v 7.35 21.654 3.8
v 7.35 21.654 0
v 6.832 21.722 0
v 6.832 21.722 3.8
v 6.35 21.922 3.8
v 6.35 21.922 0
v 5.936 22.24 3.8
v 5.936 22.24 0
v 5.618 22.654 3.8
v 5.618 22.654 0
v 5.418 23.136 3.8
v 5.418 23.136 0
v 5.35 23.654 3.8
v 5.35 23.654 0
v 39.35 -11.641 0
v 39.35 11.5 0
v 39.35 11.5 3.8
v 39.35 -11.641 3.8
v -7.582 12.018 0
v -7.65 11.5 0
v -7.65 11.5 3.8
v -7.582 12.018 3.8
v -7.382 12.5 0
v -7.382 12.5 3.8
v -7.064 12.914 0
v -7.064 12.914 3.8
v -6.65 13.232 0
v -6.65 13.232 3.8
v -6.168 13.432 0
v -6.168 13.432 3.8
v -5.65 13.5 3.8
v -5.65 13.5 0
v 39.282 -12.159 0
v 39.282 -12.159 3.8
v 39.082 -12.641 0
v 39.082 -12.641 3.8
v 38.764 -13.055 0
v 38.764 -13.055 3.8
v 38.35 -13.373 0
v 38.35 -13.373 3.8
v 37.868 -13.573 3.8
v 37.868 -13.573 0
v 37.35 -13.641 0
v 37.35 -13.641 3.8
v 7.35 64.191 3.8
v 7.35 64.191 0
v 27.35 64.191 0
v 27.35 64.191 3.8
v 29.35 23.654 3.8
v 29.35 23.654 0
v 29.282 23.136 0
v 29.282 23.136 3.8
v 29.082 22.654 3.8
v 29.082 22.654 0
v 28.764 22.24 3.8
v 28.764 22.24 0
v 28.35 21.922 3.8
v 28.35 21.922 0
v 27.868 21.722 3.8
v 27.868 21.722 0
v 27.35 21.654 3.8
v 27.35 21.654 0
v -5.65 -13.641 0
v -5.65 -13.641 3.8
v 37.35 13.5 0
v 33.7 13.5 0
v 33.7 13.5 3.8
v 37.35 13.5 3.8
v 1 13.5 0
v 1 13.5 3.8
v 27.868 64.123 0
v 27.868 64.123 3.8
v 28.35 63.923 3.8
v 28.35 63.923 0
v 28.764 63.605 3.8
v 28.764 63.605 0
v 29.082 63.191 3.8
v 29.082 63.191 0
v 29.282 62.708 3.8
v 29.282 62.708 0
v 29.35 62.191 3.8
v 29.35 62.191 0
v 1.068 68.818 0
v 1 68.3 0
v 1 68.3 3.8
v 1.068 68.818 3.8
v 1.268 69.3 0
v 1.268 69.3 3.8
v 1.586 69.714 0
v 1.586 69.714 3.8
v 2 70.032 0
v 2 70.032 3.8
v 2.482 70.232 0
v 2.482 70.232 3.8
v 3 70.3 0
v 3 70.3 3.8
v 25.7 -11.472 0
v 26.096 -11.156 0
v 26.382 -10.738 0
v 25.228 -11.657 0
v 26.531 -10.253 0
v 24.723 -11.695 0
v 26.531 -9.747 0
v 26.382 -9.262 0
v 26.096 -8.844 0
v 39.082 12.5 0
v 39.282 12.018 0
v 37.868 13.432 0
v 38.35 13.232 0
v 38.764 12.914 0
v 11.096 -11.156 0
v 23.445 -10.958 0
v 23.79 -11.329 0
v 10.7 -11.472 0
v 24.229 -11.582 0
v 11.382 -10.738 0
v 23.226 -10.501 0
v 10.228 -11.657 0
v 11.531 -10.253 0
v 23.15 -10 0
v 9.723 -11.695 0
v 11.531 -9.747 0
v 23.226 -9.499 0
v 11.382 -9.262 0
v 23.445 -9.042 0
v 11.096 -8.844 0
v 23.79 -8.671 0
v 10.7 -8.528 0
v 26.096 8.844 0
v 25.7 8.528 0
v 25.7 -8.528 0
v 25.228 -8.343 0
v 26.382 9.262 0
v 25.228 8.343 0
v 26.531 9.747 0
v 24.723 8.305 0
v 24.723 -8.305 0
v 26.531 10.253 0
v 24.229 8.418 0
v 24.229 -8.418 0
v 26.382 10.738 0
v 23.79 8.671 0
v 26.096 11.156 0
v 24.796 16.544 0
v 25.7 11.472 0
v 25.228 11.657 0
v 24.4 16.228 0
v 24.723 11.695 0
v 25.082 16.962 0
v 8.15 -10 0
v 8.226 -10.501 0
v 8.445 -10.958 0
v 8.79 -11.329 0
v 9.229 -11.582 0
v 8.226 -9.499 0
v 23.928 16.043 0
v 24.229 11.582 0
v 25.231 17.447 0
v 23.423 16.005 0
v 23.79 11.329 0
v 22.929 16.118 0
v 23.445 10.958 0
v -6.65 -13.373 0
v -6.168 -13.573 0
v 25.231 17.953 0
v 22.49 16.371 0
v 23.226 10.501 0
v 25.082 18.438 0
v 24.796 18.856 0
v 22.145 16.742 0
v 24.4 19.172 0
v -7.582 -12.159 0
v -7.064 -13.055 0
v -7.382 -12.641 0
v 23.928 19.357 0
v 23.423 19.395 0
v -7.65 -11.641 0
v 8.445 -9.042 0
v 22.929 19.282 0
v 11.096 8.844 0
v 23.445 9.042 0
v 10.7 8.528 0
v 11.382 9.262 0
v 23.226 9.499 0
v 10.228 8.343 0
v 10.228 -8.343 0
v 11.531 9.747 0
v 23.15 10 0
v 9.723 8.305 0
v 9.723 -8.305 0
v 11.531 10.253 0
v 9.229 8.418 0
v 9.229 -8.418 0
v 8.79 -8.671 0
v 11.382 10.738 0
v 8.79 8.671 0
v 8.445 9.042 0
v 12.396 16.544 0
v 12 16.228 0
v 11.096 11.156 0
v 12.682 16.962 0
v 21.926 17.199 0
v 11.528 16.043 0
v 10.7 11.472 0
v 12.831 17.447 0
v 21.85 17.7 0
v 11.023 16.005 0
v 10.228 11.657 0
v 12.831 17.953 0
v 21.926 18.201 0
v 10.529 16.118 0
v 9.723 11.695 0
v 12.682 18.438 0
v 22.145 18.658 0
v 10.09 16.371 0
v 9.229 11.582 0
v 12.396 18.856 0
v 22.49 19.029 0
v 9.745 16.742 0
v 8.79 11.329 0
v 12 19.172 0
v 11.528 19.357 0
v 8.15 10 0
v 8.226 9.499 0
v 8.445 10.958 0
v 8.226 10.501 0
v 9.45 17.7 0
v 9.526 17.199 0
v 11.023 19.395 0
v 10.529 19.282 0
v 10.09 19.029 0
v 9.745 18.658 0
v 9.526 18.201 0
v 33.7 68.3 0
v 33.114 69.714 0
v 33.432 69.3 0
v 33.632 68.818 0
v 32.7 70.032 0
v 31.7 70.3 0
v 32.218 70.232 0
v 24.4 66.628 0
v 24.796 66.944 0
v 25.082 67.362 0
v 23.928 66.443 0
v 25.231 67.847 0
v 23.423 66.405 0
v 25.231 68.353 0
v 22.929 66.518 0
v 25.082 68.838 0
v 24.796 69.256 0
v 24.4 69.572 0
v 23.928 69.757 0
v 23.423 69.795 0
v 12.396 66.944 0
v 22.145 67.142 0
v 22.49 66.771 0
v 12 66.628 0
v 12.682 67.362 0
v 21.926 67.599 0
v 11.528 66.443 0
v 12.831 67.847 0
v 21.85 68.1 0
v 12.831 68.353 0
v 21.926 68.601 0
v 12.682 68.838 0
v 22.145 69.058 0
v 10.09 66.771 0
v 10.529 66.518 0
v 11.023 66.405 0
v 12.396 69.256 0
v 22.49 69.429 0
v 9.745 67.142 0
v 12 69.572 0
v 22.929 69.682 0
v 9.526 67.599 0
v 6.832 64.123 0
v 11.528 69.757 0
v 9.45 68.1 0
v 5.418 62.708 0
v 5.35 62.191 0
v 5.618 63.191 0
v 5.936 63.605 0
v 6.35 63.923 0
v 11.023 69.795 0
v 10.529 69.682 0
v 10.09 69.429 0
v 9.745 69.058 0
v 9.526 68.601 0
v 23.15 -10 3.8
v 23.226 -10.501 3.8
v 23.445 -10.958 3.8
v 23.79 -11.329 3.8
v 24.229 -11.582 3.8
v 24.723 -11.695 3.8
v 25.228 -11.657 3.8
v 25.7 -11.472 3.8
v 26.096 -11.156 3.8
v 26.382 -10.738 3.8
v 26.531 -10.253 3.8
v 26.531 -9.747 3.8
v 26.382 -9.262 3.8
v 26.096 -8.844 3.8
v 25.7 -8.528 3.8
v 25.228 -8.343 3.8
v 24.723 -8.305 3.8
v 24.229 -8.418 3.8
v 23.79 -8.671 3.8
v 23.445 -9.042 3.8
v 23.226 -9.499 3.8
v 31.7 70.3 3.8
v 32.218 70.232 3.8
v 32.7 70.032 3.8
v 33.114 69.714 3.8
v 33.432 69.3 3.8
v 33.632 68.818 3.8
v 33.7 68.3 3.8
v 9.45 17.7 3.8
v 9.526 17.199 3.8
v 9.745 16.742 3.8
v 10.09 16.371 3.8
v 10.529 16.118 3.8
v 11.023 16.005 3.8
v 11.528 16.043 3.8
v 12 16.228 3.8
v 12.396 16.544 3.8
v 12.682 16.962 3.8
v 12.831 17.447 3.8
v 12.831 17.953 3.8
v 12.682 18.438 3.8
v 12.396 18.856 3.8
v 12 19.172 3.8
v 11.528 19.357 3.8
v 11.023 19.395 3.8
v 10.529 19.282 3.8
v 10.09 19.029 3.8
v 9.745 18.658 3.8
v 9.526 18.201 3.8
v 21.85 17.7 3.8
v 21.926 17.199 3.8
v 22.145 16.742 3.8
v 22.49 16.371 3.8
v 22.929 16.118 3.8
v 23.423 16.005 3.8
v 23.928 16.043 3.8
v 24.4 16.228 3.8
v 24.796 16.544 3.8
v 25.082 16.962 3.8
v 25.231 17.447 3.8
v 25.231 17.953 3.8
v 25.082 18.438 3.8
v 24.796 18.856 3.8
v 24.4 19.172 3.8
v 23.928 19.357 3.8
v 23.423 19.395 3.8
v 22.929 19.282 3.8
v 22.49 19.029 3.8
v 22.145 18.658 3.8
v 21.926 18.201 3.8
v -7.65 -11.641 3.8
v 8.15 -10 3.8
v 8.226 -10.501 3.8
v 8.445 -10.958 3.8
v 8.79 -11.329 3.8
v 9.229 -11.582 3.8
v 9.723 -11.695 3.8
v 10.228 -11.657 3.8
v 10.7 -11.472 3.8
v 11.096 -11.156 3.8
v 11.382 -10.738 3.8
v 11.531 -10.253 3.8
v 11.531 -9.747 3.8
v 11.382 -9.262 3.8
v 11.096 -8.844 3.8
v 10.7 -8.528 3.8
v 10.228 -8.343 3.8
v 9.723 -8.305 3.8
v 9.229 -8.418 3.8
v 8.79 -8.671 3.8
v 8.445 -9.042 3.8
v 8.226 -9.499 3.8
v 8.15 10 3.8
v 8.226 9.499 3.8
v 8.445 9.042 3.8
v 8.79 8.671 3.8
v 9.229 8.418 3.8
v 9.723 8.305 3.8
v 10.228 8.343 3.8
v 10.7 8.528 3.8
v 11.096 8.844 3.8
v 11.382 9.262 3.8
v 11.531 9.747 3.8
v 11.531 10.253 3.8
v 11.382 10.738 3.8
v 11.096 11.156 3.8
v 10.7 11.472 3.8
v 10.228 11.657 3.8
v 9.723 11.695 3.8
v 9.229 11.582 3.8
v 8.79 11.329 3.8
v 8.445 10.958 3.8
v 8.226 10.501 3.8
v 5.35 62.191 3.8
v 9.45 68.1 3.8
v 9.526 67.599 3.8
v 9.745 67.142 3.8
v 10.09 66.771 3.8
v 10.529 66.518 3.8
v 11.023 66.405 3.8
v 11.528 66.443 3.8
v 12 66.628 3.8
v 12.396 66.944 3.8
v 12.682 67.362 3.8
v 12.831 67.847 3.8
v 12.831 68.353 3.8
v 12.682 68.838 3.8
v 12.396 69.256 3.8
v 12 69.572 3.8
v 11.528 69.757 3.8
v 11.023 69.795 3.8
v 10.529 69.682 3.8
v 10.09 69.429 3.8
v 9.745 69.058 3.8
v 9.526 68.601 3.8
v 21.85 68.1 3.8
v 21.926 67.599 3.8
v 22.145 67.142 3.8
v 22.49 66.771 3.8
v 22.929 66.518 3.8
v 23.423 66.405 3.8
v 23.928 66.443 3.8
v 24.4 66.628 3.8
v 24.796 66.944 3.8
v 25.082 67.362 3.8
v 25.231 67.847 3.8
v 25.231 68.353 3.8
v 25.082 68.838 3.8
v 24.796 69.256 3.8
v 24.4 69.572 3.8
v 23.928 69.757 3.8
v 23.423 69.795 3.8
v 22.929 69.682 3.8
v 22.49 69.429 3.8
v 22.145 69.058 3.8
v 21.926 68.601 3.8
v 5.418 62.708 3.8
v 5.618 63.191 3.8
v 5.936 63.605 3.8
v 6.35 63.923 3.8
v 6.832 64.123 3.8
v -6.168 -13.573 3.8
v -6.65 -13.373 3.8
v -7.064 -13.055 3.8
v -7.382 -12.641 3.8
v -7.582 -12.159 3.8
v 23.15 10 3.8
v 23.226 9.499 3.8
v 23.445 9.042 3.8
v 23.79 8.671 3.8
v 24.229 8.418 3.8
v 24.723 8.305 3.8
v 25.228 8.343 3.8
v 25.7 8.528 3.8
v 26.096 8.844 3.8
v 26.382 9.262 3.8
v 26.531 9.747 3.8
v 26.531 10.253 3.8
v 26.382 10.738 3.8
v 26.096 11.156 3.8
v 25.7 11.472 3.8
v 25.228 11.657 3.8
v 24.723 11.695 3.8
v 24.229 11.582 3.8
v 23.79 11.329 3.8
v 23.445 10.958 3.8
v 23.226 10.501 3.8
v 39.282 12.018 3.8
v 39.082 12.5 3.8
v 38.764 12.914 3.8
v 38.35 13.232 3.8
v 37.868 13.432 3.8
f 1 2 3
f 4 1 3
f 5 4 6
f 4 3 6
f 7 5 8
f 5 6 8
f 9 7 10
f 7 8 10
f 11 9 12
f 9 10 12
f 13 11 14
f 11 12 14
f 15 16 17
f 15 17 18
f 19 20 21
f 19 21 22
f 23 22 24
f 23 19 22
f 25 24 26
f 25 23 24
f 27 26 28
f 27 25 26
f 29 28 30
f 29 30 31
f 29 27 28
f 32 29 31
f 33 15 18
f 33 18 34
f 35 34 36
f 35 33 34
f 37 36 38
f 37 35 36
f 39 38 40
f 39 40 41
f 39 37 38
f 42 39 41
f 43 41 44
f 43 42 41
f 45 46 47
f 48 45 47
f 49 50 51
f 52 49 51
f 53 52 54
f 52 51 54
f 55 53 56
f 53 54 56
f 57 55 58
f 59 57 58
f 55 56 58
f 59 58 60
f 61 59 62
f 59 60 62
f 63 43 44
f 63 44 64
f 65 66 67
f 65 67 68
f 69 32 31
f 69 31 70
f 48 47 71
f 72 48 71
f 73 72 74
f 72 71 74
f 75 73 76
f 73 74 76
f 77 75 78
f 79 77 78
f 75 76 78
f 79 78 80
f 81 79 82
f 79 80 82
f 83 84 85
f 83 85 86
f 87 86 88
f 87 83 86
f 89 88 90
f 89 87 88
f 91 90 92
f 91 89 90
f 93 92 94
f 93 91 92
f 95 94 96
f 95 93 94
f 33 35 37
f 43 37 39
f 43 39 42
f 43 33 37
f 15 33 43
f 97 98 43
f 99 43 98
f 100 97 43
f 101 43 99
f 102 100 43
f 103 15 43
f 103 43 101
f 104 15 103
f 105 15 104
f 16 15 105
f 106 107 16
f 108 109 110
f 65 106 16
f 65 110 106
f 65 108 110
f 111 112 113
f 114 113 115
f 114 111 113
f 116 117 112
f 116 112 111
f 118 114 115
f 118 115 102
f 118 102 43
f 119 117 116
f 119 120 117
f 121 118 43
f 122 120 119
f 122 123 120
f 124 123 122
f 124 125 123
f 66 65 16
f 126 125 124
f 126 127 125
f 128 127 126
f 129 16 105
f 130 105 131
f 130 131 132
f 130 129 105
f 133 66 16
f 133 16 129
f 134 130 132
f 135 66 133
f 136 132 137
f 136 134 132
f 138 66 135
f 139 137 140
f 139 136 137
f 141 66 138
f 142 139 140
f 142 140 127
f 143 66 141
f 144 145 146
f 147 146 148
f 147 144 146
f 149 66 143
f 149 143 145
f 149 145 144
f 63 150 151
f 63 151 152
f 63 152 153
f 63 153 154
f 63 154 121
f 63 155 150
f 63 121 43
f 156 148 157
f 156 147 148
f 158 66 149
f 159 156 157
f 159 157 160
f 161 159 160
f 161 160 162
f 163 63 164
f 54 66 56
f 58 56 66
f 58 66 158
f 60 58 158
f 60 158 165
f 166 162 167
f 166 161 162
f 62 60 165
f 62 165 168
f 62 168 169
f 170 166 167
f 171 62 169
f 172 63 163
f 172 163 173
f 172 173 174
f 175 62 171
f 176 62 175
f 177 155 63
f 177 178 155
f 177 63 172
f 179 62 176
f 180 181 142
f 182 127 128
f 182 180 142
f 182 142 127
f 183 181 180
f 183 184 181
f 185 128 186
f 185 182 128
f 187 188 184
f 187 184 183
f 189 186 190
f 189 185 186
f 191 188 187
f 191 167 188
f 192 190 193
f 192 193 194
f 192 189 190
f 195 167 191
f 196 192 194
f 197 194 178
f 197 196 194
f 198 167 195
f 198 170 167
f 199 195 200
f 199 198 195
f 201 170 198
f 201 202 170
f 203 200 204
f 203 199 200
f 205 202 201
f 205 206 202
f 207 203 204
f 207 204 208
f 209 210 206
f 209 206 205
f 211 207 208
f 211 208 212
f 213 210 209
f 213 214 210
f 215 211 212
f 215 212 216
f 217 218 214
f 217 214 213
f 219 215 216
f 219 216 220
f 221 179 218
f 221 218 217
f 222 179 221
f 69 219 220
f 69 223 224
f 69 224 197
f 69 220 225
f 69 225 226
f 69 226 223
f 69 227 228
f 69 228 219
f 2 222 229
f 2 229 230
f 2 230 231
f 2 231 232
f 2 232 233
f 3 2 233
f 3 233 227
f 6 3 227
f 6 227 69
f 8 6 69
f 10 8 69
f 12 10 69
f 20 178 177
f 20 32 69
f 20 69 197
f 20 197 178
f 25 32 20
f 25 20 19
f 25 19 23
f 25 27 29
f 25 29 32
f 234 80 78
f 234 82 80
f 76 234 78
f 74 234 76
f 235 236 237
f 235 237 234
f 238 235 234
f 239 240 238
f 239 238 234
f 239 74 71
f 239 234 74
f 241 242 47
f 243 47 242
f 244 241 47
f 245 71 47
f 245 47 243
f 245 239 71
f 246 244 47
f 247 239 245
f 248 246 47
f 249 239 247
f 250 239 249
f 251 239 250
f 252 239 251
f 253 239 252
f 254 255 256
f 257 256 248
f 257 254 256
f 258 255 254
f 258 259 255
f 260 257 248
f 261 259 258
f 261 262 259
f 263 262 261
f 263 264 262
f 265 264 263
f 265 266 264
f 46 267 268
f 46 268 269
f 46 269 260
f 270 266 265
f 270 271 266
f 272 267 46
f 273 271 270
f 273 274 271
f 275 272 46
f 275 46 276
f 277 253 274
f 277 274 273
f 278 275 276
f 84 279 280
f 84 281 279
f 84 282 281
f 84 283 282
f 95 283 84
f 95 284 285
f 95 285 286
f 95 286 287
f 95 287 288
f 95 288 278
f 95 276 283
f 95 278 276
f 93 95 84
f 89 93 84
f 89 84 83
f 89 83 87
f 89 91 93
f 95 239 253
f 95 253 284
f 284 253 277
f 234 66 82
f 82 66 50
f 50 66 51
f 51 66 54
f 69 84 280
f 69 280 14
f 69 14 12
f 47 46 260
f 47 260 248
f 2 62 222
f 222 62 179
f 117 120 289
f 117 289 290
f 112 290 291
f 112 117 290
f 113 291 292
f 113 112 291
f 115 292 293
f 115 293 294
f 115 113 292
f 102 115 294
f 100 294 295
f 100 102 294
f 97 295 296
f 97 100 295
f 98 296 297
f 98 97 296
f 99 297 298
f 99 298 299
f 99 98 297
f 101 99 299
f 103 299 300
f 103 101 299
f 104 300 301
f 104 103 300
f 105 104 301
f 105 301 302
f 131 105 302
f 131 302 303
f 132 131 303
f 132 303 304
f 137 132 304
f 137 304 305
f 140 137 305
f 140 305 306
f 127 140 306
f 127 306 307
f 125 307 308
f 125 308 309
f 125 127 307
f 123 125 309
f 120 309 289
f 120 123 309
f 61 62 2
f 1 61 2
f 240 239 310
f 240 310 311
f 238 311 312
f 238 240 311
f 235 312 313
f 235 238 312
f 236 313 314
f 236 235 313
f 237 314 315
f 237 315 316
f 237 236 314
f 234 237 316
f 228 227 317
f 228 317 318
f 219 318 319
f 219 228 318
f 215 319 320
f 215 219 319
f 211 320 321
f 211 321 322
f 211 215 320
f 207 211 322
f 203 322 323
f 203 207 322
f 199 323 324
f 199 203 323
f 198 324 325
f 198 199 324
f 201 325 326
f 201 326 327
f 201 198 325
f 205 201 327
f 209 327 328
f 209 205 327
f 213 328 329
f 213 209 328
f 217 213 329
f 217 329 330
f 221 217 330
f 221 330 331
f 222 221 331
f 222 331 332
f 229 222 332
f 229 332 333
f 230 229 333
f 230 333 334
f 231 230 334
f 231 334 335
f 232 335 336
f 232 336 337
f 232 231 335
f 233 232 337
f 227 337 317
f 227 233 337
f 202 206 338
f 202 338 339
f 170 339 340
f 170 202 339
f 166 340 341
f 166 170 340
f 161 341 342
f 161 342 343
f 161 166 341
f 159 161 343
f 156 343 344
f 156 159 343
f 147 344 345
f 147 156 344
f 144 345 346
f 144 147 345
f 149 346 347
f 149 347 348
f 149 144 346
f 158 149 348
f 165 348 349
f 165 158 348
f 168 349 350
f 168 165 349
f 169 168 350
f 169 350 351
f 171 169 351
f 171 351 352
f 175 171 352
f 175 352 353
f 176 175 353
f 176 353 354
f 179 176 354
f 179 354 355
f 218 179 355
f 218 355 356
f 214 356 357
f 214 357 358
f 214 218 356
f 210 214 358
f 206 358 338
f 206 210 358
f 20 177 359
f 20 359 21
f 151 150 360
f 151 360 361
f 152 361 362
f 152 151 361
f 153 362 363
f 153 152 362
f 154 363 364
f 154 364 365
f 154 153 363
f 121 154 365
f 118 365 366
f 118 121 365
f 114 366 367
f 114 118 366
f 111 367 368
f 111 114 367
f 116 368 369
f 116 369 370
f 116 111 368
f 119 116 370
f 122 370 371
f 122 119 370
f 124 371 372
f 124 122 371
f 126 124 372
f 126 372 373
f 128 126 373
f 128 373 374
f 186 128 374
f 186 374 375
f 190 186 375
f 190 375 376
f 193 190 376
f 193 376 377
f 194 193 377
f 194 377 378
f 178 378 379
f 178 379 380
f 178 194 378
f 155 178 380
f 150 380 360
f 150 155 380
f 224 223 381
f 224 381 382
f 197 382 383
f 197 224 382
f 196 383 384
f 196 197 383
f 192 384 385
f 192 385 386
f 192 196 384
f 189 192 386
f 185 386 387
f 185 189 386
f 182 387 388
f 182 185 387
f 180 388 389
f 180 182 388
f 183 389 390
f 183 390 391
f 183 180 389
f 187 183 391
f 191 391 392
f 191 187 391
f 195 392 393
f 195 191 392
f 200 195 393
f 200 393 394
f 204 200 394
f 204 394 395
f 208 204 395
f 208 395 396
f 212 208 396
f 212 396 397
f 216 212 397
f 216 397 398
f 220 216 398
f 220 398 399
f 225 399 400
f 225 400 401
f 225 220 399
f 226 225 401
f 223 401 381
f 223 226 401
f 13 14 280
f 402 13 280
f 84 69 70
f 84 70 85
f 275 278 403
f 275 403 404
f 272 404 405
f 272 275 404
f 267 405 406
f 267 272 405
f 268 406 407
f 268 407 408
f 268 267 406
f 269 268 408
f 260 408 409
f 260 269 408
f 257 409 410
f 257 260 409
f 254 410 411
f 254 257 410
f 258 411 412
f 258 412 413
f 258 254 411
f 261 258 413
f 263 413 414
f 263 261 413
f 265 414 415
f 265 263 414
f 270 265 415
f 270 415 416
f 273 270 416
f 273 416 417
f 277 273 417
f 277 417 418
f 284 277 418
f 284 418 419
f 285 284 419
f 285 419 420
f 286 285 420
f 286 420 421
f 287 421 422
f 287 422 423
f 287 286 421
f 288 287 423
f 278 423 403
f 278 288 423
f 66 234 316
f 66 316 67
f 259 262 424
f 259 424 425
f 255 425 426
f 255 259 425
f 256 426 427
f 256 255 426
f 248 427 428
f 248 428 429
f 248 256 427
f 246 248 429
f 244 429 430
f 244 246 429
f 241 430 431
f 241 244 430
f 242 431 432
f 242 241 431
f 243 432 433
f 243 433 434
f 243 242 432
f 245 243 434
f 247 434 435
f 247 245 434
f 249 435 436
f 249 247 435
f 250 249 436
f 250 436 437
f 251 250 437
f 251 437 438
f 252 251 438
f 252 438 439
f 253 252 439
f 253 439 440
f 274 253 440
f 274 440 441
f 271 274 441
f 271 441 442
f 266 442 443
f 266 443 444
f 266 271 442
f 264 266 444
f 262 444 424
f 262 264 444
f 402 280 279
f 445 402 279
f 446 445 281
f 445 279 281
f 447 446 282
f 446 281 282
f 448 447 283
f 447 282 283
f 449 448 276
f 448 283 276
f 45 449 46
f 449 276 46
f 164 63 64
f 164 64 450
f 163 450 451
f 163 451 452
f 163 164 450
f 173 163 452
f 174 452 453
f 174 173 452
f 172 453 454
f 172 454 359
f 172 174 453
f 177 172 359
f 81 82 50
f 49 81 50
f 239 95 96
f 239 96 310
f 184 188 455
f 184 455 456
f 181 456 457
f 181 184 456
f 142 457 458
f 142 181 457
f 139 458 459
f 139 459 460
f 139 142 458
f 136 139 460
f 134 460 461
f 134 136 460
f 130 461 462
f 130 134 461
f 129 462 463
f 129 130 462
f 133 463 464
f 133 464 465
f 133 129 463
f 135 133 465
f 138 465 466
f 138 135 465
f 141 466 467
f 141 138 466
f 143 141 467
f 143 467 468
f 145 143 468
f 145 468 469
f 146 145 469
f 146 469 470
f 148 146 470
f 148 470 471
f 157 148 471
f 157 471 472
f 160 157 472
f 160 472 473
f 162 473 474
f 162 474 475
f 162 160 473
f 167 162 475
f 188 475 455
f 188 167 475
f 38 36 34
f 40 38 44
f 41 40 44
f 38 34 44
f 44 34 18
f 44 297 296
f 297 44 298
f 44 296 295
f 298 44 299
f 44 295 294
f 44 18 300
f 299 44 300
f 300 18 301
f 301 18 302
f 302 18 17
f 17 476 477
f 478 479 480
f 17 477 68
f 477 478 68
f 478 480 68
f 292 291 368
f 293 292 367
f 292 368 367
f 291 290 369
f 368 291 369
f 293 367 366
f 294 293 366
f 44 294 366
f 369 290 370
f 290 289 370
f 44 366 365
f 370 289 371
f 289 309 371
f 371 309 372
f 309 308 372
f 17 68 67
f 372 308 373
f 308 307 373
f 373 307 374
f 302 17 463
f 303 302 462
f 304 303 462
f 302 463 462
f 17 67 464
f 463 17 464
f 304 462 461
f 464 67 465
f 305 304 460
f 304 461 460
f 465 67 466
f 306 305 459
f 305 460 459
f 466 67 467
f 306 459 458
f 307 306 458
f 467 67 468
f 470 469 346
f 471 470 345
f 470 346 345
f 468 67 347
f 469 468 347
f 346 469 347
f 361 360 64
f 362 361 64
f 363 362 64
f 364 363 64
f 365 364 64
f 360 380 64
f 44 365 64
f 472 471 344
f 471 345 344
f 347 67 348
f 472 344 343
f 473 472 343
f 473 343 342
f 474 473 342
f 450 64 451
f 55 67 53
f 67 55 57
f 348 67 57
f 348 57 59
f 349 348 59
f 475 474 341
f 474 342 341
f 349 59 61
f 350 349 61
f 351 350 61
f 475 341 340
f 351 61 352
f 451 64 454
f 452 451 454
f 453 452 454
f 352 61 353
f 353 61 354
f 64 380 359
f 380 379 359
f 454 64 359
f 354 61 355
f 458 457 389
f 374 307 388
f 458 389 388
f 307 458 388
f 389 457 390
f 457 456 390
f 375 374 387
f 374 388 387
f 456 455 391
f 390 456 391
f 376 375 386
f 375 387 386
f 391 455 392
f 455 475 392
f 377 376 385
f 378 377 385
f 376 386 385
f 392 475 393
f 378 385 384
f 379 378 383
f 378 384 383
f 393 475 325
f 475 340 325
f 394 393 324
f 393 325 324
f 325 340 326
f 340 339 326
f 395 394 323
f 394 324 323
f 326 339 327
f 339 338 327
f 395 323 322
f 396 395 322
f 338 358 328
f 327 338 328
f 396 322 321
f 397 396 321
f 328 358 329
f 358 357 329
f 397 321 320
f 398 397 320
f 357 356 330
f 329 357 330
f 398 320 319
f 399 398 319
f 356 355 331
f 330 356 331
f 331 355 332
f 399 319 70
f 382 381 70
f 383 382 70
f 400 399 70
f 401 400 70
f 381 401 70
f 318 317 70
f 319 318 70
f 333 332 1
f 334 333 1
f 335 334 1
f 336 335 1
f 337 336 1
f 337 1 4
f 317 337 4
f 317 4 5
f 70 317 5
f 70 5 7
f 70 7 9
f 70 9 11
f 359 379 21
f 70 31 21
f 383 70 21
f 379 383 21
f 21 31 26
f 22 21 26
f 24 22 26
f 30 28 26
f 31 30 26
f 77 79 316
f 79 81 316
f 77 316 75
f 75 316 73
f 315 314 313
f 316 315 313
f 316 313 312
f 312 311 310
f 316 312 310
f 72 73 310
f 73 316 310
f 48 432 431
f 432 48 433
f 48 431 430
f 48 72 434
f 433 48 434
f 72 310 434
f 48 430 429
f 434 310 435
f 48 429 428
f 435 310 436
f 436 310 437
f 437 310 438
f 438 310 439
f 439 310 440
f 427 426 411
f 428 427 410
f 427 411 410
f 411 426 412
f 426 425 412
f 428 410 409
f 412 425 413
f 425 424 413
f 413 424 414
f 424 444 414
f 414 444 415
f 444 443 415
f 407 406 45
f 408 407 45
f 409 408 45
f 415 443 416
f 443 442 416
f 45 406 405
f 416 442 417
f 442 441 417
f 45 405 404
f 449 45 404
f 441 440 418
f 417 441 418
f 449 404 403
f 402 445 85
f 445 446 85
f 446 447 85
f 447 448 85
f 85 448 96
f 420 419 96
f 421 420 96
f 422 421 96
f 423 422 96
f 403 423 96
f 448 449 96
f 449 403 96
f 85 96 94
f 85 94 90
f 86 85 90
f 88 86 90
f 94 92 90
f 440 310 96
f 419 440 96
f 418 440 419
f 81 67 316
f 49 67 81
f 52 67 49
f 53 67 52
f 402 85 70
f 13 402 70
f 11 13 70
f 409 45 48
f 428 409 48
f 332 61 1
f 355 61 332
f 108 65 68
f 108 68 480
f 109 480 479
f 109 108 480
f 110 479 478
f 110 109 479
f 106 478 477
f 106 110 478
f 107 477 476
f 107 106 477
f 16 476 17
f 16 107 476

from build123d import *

# Parameters (mm, degrees)
SKETCH1_R           = 1.7
BOSS_EXTRUDE1_DEPTH = 3.8


with BuildPart() as part:
    # Sketch1 → Boss-Extrude1 (new body)
    with BuildSketch(Plane.XY):
        with BuildLine():
            Line((3.000019473, 70.3), (31.700019473, 70.3))
            ThreePointArc((31.700019473, 70.3), (33.114233035, 69.714213562), (33.700019473, 68.3))
            Line((33.700019473, 68.3), (33.700019473, 13.5))
            Line((33.700019473, 13.5), (37.350019473, 13.5))
            ThreePointArc((37.350019473, 13.5), (38.764233035, 12.914213562), (39.350019473, 11.5))
            Line((39.350019473, 11.5), (39.350019473, -11.641128199))
            ThreePointArc((39.350019473, -11.641128199), (38.764233035, -13.055341761), (37.350019473, -13.641128199))
            Line((37.350019473, -13.641128199), (31.700019473, -13.641128199))
            Line((31.700019473, -13.641128199), (3.000019473, -13.641128199))
            Line((3.000019473, -13.641128199), (-5.649980527, -13.641128199))
            ThreePointArc((-5.649980527, -13.641128199), (-7.064194089, -13.055341761), (-7.649980527, -11.641128199))
            Line((-7.649980527, -11.641128199), (-7.649980527, 11.5))
            ThreePointArc((-7.649980527, 11.5), (-7.064194089, 12.914213562), (-5.649980527, 13.5))
            Line((-5.649980527, 13.5), (1.000019473, 13.5))
            Line((1.000019473, 13.5), (1.000019473, 68.3))
            ThreePointArc((1.000019473, 68.3), (1.585805911, 69.714213562), (3.000019473, 70.3))
        make_face()
        with Locations(Location((11.15, 17.7, 0), (0, 0, 180))):
            Circle(SKETCH1_R, mode=Mode.SUBTRACT)
        with Locations(Location((9.85, 10, 0), (0, 0, 180))):
            Circle(SKETCH1_R, mode=Mode.SUBTRACT)
        with Locations(Location((24.85, 10, 0), (0, 0, 180))):
            Circle(SKETCH1_R, mode=Mode.SUBTRACT)
        with Locations(Location((9.85, -10, 0), (0, 0, 180))):
            Circle(SKETCH1_R, mode=Mode.SUBTRACT)
        with Locations(Location((24.85, -10, 0), (0, 0, 180))):
            Circle(SKETCH1_R, mode=Mode.SUBTRACT)
        with Locations(Location((23.55, 17.7, 0), (0, 0, 180))):
            Circle(SKETCH1_R, mode=Mode.SUBTRACT)
        with Locations(Location((23.55, 68.1, 0), (0, 0, 180))):
            Circle(SKETCH1_R, mode=Mode.SUBTRACT)
        with Locations(Location((11.15, 68.1, 0), (0, 0, 180))):
            Circle(SKETCH1_R, mode=Mode.SUBTRACT)
        with BuildLine():
            Line((7.35, 64.190811085), (27.35, 64.190811085))
            ThreePointArc((27.35, 64.190811085), (28.764213562, 63.605024648), (29.35, 62.190811085))
            Line((29.35, 62.190811085), (29.35, 23.654008347))
            ThreePointArc((29.35, 23.654008347), (28.764213562, 22.239794784), (27.35, 21.654008347))
            Line((27.35, 21.654008347), (7.35, 21.654008347))
            ThreePointArc((7.35, 21.654008347), (5.935786438, 22.239794784), (5.35, 23.654008347))
            Line((5.35, 23.654008347), (5.35, 62.190811085))
            ThreePointArc((5.35, 62.190811085), (5.935786438, 63.605024648), (7.35, 64.190811085))
        make_face(mode=Mode.SUBTRACT)
    extrude(amount=BOSS_EXTRUDE1_DEPTH)


solid = part.part
